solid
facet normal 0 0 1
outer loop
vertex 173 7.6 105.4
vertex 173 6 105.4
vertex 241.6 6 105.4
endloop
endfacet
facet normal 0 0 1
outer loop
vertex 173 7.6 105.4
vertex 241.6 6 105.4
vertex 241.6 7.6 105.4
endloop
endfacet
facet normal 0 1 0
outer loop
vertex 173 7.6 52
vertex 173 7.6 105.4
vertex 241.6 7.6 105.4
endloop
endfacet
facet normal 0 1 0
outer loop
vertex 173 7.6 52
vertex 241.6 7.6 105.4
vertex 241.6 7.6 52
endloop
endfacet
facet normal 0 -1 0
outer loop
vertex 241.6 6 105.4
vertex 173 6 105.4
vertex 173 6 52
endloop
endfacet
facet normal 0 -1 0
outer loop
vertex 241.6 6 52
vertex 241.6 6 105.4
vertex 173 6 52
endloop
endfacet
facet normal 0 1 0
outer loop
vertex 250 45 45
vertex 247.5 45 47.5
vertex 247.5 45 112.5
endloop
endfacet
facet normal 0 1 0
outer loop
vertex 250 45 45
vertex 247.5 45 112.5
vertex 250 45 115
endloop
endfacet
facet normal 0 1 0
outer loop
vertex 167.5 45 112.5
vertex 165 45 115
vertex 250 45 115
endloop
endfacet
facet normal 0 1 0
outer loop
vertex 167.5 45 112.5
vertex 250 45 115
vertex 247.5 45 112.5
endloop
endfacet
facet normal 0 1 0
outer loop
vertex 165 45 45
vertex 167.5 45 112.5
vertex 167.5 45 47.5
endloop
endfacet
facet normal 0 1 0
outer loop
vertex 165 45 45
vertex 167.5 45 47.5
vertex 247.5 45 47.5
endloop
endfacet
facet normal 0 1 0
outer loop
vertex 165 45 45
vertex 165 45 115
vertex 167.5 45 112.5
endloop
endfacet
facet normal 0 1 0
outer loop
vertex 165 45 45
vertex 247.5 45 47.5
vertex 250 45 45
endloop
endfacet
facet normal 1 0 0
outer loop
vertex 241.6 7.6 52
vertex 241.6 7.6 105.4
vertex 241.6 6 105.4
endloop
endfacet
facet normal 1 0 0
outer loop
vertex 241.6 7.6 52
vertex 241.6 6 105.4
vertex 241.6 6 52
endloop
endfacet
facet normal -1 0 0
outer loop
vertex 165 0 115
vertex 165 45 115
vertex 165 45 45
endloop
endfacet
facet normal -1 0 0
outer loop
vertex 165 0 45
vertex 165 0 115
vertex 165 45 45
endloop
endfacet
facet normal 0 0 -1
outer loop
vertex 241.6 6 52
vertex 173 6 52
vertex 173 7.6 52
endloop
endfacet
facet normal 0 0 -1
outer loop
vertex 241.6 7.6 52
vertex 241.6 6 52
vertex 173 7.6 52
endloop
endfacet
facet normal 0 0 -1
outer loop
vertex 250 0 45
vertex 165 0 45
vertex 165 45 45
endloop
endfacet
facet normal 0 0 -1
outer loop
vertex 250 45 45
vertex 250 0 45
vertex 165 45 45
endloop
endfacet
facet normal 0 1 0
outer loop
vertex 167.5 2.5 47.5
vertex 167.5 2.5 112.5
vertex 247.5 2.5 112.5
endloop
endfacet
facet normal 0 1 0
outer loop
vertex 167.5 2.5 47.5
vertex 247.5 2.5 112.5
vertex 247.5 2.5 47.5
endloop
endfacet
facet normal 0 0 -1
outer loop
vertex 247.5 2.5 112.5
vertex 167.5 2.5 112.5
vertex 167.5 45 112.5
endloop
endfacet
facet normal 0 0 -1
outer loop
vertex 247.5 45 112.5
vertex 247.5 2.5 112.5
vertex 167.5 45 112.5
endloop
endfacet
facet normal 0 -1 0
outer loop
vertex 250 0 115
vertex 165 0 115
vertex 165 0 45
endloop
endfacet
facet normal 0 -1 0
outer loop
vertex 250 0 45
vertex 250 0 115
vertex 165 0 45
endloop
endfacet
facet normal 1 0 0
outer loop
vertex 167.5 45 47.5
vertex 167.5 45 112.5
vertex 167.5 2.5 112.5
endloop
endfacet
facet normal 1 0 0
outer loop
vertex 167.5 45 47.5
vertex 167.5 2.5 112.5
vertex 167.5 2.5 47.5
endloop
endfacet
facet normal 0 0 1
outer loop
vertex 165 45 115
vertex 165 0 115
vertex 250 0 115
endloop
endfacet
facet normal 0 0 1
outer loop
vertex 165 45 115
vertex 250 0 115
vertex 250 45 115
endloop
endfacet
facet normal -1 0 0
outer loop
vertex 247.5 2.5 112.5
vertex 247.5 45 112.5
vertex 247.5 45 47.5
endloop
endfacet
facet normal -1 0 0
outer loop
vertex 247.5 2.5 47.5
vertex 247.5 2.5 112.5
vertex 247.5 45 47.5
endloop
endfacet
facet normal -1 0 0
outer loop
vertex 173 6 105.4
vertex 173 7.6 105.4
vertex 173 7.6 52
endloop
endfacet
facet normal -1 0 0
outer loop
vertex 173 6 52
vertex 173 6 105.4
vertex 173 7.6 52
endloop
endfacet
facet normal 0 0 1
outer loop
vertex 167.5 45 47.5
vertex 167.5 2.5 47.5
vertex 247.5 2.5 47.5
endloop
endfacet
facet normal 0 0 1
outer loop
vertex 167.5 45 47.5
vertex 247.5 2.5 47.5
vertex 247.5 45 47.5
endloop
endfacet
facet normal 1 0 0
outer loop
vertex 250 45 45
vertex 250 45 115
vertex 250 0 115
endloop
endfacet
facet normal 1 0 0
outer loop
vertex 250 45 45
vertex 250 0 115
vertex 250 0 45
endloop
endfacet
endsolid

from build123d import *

# Parameters (mm, degrees)
ENCLOSURE_START   = 165
SKETCH1_W         = 70
SKETCH1_H         = 45
ENCLOSURE_DEPTH   = 85
CAVITY_START      = 167.5
SKETCH2_W         = 65
SKETCH2_H         = 47.5
CAVITY_DEPTH      = 80
ARDUINO_UNO_START = 173
SKETCH3_W         = 53.4
SKETCH3_H         = 1.6
ARDUINO_UNO_DEPTH = 68.6


with BuildPart() as part:
    # Sketch1 → enclosure (new body)
    with BuildSketch(Plane(origin=(0, 0, 0), x_dir=(0, 0, -1), z_dir=(1, 0, 0)).offset(ENCLOSURE_START)):
        with Locations((-80, 22.5)):
            Rectangle(SKETCH1_W, SKETCH1_H)
    extrude(amount=ENCLOSURE_DEPTH)


with BuildPart() as body_2:
    # Sketch2 → cavity (new body)
    with BuildSketch(Plane(origin=(0, 0, 0), x_dir=(0, 0, -1), z_dir=(1, 0, 0)).offset(CAVITY_START)):
        with Locations((-80, 26.25)):
            Rectangle(SKETCH2_W, SKETCH2_H)
    extrude(amount=CAVITY_DEPTH)


with BuildPart() as part_1:
    add(part.part)

    # Combine1: cut body 2
    add(body_2.part, mode=Mode.SUBTRACT)


with BuildPart() as body_2_2:
    # Sketch3 → arduino_uno (new body)
    with BuildSketch(Plane(origin=(0, 0, 0), x_dir=(0, 0, -1), z_dir=(1, 0, 0)).offset(ARDUINO_UNO_START)):
        with Locations((-78.7, 6.8)):
            Rectangle(SKETCH3_W, SKETCH3_H)
    extrude(amount=ARDUINO_UNO_DEPTH)


solid = Compound([part_1.part, body_2_2.part])
